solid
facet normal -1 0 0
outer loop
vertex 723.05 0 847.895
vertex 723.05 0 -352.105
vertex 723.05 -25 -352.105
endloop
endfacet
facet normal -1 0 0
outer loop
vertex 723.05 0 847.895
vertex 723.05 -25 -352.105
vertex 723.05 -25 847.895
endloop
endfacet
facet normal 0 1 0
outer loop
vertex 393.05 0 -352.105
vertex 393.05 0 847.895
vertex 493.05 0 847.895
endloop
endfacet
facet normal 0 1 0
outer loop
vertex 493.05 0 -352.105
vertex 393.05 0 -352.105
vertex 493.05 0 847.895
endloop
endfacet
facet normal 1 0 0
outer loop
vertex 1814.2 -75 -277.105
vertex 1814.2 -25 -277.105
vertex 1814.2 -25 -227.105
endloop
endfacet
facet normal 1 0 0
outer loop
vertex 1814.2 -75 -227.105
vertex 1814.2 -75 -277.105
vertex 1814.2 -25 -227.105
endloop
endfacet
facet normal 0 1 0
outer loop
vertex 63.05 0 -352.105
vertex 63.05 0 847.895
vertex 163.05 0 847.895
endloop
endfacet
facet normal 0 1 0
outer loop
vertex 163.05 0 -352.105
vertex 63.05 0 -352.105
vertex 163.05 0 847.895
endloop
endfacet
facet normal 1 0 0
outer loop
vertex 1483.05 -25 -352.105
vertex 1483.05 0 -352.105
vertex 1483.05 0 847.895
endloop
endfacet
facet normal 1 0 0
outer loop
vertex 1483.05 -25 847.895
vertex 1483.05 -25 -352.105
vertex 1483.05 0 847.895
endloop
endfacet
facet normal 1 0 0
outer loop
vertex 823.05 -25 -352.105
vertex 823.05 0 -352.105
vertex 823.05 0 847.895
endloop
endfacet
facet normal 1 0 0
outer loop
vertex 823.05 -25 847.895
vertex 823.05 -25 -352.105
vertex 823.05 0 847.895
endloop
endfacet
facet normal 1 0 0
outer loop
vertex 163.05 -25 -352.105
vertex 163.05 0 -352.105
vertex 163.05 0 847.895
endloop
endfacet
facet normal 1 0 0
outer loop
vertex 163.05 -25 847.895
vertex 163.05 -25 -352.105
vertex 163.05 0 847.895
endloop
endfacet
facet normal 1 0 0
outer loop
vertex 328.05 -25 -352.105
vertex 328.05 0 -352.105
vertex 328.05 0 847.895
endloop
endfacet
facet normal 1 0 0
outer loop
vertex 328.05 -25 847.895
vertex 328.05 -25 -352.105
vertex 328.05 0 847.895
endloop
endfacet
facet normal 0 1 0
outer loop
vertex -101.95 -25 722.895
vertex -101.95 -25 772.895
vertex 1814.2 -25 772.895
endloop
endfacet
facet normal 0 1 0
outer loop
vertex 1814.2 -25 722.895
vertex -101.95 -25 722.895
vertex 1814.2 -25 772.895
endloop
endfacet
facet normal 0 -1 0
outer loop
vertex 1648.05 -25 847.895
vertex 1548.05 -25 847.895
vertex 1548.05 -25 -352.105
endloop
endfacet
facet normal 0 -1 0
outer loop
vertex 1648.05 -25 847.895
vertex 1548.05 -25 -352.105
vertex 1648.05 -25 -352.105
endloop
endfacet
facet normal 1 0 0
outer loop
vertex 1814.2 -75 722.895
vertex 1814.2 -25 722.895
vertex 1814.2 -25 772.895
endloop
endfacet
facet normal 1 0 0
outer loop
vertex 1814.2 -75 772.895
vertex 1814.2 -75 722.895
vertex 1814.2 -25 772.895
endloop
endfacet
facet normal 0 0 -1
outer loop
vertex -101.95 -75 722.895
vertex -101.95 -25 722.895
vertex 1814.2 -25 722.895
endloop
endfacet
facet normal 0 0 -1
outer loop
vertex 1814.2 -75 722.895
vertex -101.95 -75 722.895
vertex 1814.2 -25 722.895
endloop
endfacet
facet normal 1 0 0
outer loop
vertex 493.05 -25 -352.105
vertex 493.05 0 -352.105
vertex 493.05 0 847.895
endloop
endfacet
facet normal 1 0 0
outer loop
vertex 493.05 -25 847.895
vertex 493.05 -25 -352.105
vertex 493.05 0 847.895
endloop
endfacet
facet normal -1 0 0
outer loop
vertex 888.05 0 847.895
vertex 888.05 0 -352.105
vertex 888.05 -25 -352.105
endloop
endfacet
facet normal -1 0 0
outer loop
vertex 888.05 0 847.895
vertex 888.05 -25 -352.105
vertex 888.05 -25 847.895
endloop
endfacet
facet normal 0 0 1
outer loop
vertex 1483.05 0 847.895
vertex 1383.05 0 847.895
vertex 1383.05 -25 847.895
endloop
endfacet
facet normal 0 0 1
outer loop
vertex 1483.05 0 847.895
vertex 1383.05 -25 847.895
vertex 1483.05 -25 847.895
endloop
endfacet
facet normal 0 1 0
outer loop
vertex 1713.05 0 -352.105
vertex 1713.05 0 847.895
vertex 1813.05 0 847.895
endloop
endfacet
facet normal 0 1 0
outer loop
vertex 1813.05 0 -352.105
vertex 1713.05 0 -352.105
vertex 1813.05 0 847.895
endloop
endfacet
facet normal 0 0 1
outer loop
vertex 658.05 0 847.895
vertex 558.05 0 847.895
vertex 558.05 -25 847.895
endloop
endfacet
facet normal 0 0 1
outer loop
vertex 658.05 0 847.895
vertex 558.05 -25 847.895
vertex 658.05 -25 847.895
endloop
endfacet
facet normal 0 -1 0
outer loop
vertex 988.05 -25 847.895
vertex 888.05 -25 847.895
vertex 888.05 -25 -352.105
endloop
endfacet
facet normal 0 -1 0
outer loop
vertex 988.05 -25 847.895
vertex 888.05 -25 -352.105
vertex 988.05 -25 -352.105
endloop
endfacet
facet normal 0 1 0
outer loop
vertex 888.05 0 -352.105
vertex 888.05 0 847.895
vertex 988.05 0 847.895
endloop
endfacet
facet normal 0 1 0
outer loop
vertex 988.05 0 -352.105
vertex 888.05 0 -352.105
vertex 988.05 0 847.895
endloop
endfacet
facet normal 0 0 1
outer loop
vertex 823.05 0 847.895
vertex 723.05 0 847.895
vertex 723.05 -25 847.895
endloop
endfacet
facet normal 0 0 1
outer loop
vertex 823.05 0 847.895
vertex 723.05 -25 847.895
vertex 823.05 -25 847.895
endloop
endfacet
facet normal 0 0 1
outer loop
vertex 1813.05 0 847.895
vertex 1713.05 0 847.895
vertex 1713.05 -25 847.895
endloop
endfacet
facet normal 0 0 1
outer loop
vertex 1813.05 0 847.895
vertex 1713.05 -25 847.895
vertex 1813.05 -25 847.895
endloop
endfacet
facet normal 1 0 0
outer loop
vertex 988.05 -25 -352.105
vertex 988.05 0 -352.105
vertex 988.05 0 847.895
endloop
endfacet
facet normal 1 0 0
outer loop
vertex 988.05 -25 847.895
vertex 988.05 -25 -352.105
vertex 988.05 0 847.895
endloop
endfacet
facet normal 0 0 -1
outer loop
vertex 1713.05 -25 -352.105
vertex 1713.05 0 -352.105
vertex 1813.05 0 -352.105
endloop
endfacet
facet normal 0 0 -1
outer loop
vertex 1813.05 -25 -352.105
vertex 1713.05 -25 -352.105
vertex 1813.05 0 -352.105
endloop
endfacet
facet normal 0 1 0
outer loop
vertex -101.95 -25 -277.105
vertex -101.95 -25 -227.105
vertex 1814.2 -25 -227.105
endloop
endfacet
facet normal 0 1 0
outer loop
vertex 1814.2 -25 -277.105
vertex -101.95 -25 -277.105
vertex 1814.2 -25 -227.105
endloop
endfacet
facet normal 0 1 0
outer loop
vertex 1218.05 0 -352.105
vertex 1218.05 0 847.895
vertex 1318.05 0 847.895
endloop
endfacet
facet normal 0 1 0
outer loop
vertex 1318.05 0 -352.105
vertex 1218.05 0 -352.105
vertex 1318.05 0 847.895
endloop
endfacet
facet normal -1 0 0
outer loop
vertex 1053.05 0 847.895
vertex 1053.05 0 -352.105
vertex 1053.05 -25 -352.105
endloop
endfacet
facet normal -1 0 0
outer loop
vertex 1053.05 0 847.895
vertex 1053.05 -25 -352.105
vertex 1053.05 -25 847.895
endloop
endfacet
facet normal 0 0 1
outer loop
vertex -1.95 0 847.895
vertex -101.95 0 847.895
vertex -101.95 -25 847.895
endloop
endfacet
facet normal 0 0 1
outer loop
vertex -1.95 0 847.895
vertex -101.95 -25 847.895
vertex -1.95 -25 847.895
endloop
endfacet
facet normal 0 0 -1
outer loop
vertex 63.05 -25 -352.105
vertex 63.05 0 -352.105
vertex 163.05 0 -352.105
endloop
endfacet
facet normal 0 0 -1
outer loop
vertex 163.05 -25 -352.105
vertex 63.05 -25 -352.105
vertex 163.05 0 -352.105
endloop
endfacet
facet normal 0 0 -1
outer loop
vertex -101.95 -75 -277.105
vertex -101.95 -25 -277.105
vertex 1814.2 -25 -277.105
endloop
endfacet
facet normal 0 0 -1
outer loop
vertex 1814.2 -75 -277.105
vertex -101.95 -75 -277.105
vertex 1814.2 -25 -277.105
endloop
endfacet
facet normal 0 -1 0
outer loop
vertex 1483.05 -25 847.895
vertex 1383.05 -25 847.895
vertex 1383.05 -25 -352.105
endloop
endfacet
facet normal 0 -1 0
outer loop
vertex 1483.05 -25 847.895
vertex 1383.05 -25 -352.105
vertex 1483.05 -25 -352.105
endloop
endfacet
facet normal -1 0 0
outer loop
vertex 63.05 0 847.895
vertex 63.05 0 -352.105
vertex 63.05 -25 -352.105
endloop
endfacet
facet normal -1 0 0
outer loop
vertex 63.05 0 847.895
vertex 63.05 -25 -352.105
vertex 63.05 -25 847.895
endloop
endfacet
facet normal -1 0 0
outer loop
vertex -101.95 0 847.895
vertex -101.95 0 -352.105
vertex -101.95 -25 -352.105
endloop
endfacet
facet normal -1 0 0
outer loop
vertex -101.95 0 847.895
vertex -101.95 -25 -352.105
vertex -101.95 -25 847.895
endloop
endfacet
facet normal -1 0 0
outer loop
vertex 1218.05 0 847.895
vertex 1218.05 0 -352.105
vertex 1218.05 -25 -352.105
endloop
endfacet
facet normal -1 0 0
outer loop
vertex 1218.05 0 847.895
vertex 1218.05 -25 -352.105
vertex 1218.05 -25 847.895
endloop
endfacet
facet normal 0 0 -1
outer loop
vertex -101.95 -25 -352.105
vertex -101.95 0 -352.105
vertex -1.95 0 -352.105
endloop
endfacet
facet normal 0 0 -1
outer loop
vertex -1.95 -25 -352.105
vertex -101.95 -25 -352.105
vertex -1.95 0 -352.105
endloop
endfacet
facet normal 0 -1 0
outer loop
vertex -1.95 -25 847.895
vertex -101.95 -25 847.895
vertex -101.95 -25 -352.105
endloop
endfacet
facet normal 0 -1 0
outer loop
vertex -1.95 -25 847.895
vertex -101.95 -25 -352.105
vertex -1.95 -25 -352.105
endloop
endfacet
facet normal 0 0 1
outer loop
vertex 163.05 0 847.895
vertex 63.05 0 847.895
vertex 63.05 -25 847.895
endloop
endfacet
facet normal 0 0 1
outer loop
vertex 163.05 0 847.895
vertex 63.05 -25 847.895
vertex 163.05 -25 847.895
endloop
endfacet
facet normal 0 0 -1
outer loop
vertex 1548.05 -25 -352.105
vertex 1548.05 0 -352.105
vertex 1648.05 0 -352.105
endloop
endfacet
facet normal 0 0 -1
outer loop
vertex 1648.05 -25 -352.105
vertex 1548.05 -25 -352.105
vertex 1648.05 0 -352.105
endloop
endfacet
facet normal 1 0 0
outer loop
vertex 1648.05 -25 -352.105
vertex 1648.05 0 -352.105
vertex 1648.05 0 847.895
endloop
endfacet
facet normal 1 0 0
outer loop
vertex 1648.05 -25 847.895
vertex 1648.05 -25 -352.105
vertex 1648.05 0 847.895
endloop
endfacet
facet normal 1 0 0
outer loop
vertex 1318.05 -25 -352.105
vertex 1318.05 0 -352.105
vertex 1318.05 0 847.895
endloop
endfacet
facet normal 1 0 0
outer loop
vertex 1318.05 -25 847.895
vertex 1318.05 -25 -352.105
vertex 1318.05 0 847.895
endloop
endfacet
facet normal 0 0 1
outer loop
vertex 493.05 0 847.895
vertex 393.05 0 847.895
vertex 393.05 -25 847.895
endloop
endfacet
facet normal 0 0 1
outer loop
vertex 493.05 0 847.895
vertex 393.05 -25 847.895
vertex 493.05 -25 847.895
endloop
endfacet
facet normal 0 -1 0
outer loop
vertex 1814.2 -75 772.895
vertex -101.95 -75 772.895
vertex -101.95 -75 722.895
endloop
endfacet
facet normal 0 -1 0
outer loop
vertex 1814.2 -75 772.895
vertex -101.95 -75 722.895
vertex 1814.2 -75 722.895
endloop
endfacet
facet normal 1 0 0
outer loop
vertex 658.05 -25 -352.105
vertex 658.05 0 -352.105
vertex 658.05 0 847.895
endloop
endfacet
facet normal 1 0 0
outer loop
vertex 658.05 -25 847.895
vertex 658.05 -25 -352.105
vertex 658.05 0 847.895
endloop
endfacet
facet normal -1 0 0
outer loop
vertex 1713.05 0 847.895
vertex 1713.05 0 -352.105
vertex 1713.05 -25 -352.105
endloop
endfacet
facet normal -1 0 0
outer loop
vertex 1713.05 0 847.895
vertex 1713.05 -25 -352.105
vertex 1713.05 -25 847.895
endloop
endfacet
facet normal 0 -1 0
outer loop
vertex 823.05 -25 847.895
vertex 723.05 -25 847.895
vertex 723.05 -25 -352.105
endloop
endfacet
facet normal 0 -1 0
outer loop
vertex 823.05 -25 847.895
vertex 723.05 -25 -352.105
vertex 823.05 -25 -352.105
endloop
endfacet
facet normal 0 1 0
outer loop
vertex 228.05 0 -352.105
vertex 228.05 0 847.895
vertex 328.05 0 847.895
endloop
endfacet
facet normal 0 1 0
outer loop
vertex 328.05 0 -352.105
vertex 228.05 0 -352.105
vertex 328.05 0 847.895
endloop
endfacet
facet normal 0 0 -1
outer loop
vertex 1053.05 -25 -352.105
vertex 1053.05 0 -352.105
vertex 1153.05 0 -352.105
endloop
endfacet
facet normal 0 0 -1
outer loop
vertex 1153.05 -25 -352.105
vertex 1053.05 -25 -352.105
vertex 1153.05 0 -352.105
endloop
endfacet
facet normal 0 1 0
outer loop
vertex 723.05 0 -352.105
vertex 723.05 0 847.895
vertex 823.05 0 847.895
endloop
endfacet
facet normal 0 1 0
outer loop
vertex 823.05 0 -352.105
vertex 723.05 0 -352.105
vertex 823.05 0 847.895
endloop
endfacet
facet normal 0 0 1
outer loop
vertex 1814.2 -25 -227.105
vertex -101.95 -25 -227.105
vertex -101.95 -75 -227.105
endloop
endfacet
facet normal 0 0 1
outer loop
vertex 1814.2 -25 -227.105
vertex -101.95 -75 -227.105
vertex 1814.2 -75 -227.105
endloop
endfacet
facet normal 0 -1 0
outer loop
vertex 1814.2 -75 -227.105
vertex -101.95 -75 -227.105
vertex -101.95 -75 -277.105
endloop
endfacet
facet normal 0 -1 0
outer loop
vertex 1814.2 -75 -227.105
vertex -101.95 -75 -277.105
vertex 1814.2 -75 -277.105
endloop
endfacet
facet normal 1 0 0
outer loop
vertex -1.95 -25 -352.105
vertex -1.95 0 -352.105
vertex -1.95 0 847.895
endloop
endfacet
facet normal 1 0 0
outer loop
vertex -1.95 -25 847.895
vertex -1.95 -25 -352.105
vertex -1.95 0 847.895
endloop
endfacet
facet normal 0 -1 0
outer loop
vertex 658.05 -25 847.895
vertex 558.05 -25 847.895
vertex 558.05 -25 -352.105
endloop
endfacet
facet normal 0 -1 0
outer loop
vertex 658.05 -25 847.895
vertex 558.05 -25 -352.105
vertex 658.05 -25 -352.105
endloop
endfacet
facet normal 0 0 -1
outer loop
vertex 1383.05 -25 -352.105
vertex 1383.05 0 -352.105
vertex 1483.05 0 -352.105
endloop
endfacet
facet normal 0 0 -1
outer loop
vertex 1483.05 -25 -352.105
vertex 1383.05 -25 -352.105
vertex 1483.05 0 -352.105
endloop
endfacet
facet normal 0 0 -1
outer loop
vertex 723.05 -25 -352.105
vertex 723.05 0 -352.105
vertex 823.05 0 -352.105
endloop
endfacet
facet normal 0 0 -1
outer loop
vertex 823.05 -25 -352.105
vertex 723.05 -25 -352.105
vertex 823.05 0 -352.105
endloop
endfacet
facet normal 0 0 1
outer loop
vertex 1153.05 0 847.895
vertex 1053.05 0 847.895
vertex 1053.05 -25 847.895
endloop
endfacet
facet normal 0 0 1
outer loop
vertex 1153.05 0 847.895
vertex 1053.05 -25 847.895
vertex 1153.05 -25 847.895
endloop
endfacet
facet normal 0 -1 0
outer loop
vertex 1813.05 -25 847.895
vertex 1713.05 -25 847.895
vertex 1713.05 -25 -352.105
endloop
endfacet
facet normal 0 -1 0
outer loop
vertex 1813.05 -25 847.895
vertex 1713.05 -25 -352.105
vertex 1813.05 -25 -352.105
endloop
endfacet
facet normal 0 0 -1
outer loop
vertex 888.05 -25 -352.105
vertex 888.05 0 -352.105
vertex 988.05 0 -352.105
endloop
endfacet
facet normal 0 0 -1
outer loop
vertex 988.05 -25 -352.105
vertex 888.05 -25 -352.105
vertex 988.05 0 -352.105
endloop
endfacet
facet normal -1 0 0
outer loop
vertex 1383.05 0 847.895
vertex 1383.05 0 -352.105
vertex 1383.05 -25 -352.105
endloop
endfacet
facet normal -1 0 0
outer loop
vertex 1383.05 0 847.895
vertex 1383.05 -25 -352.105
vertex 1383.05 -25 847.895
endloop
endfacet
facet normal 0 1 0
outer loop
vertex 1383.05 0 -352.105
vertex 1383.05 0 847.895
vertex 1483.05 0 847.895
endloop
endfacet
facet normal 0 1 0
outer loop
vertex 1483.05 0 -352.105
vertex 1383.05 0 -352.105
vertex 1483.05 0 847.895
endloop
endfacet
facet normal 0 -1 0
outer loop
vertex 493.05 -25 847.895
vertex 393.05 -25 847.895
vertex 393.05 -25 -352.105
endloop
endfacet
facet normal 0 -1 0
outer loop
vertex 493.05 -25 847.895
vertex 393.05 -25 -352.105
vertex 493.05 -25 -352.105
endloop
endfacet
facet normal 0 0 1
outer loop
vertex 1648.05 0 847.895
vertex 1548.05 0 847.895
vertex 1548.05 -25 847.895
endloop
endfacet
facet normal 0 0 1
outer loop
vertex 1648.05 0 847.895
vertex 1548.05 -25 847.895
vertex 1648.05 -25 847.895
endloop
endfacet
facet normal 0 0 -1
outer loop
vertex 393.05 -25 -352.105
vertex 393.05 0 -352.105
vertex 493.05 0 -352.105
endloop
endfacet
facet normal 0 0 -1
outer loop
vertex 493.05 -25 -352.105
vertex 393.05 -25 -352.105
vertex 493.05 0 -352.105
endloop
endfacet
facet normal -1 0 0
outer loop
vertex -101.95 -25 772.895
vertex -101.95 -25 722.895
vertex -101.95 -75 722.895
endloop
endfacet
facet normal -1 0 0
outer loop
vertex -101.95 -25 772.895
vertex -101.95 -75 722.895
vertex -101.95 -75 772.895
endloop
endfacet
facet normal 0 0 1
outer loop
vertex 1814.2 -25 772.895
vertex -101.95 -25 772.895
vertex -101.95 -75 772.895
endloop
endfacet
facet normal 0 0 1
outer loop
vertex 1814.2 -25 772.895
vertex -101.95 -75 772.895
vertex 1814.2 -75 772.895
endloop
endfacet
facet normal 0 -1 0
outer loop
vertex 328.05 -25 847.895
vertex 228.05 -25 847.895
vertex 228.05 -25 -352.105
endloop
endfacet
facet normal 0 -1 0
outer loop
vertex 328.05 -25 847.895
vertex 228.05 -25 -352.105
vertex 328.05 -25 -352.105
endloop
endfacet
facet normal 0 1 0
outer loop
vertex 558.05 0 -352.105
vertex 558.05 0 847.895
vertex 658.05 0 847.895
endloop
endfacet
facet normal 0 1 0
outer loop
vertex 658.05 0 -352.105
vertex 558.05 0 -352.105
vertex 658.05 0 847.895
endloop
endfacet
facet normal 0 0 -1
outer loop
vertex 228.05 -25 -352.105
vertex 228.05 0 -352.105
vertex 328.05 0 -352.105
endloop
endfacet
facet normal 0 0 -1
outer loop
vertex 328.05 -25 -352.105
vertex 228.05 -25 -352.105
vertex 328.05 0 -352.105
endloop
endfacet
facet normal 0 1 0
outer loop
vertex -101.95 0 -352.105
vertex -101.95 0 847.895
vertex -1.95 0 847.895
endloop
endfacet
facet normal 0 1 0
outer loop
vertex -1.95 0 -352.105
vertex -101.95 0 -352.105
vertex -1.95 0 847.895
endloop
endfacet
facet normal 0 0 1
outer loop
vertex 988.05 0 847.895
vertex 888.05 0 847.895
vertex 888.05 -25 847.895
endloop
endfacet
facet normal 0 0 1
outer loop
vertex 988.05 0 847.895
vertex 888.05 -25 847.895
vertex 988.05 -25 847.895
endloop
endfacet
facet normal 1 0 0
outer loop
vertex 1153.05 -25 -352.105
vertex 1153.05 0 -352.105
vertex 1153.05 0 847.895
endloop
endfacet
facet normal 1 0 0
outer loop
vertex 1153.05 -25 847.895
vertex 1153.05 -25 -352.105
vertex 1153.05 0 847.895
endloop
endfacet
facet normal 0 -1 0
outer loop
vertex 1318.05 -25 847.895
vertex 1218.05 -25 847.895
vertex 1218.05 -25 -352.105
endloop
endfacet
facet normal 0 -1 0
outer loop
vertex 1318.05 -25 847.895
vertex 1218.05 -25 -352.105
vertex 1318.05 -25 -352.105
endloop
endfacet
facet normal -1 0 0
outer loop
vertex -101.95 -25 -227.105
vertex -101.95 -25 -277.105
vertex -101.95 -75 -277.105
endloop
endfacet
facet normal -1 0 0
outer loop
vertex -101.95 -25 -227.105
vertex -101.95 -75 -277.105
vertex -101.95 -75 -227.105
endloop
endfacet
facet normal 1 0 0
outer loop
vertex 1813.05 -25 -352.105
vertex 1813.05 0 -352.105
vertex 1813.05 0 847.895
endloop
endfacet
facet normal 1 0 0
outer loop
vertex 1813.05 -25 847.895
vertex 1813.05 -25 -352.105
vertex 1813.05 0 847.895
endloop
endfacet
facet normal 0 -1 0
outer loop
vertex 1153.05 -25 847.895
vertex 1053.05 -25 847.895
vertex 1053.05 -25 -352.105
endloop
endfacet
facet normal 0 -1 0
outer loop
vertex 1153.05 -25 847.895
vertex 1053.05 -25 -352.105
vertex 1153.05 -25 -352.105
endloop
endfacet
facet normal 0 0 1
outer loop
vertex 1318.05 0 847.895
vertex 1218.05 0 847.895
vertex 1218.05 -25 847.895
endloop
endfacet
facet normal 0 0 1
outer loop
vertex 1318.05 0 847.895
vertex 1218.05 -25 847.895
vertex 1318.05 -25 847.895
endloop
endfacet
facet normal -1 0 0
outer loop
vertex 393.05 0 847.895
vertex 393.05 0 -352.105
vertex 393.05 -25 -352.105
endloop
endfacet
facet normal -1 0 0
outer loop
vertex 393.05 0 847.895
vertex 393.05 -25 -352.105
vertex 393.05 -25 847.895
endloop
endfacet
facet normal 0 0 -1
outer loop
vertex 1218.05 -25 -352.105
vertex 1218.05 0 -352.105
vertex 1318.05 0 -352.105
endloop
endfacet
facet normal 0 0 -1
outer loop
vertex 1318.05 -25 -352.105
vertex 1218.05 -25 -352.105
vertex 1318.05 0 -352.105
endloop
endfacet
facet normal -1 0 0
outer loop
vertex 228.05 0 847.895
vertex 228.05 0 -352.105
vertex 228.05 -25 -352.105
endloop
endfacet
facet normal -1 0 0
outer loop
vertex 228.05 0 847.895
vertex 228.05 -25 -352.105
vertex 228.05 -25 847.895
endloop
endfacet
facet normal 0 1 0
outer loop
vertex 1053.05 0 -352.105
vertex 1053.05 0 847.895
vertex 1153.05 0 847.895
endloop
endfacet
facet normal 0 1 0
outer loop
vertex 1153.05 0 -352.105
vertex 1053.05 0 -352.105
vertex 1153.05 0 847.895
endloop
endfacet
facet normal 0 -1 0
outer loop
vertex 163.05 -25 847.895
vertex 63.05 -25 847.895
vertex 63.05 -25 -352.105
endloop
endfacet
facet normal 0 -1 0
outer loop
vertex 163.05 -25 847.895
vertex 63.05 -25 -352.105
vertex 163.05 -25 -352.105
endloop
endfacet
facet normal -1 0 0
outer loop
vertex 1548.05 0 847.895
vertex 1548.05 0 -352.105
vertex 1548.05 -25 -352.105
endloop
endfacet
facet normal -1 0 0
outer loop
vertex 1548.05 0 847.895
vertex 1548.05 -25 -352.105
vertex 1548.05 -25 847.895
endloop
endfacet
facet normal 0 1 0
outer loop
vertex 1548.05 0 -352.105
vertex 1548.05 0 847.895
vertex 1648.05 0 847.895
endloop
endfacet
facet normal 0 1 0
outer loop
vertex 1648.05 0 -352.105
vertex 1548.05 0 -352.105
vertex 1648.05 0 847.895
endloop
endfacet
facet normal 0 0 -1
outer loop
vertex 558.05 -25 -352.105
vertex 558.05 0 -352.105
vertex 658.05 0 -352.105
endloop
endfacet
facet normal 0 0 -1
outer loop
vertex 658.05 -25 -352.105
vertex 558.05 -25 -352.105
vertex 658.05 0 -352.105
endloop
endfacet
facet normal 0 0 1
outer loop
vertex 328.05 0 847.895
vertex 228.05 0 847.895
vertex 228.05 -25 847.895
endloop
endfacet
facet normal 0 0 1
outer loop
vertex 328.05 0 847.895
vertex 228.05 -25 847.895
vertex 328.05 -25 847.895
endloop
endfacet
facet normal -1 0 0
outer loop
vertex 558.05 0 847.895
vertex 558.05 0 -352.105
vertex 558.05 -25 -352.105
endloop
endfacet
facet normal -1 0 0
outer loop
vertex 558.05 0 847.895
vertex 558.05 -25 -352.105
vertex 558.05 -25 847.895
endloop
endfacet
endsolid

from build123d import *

# Parameters (mm, degrees)
F0_W     = 100
F0_H     = 1200
F1_DEPTH = 25
F2_W     = 1916.149882
F2_H     = 50
F3_DEPTH = 50


with BuildPart() as f1:
    # F0 (on Front) → F1 (new body)
    with BuildSketch(Plane.XZ):
        with Locations((113.0504, 247.89499)):
            Rectangle(F0_W, F0_H)
        with Locations((278.0504, 247.89499)):
            Rectangle(F0_W, F0_H)
        with Locations((443.0504, 247.89499)):
            Rectangle(F0_W, F0_H)
        with Locations((608.0504, 247.89499)):
            Rectangle(F0_W, F0_H)
        with Locations((773.0504, 247.89499)):
            Rectangle(F0_W, F0_H)
        with Locations((938.0504, 247.89499)):
            Rectangle(F0_W, F0_H)
        with Locations((1103.0504, 247.89499)):
            Rectangle(F0_W, F0_H)
        with Locations((1268.0504, 247.89499)):
            Rectangle(F0_W, F0_H)
        with Locations((1433.0504, 247.89499)):
            Rectangle(F0_W, F0_H)
        with Locations((1598.0504, 247.89499)):
            Rectangle(F0_W, F0_H)
        with Locations((1763.0504, 247.89499)):
            Rectangle(F0_W, F0_H)
        with Locations((-51.9496, 247.89499)):
            Rectangle(F0_W, F0_H)
    extrude(amount=F1_DEPTH)


with BuildPart() as f3:
    # F2 (on face) → F3 (new body)
    with BuildSketch(Plane.XZ.offset(25)):
        with Locations((856.125341, 747.89499)):
            Rectangle(F2_W, F2_H)
        with Locations((856.125341, -252.10501)):
            Rectangle(F2_W, F2_H)
    extrude(amount=F3_DEPTH)


solid = Compound([f1.part, f3.part])
